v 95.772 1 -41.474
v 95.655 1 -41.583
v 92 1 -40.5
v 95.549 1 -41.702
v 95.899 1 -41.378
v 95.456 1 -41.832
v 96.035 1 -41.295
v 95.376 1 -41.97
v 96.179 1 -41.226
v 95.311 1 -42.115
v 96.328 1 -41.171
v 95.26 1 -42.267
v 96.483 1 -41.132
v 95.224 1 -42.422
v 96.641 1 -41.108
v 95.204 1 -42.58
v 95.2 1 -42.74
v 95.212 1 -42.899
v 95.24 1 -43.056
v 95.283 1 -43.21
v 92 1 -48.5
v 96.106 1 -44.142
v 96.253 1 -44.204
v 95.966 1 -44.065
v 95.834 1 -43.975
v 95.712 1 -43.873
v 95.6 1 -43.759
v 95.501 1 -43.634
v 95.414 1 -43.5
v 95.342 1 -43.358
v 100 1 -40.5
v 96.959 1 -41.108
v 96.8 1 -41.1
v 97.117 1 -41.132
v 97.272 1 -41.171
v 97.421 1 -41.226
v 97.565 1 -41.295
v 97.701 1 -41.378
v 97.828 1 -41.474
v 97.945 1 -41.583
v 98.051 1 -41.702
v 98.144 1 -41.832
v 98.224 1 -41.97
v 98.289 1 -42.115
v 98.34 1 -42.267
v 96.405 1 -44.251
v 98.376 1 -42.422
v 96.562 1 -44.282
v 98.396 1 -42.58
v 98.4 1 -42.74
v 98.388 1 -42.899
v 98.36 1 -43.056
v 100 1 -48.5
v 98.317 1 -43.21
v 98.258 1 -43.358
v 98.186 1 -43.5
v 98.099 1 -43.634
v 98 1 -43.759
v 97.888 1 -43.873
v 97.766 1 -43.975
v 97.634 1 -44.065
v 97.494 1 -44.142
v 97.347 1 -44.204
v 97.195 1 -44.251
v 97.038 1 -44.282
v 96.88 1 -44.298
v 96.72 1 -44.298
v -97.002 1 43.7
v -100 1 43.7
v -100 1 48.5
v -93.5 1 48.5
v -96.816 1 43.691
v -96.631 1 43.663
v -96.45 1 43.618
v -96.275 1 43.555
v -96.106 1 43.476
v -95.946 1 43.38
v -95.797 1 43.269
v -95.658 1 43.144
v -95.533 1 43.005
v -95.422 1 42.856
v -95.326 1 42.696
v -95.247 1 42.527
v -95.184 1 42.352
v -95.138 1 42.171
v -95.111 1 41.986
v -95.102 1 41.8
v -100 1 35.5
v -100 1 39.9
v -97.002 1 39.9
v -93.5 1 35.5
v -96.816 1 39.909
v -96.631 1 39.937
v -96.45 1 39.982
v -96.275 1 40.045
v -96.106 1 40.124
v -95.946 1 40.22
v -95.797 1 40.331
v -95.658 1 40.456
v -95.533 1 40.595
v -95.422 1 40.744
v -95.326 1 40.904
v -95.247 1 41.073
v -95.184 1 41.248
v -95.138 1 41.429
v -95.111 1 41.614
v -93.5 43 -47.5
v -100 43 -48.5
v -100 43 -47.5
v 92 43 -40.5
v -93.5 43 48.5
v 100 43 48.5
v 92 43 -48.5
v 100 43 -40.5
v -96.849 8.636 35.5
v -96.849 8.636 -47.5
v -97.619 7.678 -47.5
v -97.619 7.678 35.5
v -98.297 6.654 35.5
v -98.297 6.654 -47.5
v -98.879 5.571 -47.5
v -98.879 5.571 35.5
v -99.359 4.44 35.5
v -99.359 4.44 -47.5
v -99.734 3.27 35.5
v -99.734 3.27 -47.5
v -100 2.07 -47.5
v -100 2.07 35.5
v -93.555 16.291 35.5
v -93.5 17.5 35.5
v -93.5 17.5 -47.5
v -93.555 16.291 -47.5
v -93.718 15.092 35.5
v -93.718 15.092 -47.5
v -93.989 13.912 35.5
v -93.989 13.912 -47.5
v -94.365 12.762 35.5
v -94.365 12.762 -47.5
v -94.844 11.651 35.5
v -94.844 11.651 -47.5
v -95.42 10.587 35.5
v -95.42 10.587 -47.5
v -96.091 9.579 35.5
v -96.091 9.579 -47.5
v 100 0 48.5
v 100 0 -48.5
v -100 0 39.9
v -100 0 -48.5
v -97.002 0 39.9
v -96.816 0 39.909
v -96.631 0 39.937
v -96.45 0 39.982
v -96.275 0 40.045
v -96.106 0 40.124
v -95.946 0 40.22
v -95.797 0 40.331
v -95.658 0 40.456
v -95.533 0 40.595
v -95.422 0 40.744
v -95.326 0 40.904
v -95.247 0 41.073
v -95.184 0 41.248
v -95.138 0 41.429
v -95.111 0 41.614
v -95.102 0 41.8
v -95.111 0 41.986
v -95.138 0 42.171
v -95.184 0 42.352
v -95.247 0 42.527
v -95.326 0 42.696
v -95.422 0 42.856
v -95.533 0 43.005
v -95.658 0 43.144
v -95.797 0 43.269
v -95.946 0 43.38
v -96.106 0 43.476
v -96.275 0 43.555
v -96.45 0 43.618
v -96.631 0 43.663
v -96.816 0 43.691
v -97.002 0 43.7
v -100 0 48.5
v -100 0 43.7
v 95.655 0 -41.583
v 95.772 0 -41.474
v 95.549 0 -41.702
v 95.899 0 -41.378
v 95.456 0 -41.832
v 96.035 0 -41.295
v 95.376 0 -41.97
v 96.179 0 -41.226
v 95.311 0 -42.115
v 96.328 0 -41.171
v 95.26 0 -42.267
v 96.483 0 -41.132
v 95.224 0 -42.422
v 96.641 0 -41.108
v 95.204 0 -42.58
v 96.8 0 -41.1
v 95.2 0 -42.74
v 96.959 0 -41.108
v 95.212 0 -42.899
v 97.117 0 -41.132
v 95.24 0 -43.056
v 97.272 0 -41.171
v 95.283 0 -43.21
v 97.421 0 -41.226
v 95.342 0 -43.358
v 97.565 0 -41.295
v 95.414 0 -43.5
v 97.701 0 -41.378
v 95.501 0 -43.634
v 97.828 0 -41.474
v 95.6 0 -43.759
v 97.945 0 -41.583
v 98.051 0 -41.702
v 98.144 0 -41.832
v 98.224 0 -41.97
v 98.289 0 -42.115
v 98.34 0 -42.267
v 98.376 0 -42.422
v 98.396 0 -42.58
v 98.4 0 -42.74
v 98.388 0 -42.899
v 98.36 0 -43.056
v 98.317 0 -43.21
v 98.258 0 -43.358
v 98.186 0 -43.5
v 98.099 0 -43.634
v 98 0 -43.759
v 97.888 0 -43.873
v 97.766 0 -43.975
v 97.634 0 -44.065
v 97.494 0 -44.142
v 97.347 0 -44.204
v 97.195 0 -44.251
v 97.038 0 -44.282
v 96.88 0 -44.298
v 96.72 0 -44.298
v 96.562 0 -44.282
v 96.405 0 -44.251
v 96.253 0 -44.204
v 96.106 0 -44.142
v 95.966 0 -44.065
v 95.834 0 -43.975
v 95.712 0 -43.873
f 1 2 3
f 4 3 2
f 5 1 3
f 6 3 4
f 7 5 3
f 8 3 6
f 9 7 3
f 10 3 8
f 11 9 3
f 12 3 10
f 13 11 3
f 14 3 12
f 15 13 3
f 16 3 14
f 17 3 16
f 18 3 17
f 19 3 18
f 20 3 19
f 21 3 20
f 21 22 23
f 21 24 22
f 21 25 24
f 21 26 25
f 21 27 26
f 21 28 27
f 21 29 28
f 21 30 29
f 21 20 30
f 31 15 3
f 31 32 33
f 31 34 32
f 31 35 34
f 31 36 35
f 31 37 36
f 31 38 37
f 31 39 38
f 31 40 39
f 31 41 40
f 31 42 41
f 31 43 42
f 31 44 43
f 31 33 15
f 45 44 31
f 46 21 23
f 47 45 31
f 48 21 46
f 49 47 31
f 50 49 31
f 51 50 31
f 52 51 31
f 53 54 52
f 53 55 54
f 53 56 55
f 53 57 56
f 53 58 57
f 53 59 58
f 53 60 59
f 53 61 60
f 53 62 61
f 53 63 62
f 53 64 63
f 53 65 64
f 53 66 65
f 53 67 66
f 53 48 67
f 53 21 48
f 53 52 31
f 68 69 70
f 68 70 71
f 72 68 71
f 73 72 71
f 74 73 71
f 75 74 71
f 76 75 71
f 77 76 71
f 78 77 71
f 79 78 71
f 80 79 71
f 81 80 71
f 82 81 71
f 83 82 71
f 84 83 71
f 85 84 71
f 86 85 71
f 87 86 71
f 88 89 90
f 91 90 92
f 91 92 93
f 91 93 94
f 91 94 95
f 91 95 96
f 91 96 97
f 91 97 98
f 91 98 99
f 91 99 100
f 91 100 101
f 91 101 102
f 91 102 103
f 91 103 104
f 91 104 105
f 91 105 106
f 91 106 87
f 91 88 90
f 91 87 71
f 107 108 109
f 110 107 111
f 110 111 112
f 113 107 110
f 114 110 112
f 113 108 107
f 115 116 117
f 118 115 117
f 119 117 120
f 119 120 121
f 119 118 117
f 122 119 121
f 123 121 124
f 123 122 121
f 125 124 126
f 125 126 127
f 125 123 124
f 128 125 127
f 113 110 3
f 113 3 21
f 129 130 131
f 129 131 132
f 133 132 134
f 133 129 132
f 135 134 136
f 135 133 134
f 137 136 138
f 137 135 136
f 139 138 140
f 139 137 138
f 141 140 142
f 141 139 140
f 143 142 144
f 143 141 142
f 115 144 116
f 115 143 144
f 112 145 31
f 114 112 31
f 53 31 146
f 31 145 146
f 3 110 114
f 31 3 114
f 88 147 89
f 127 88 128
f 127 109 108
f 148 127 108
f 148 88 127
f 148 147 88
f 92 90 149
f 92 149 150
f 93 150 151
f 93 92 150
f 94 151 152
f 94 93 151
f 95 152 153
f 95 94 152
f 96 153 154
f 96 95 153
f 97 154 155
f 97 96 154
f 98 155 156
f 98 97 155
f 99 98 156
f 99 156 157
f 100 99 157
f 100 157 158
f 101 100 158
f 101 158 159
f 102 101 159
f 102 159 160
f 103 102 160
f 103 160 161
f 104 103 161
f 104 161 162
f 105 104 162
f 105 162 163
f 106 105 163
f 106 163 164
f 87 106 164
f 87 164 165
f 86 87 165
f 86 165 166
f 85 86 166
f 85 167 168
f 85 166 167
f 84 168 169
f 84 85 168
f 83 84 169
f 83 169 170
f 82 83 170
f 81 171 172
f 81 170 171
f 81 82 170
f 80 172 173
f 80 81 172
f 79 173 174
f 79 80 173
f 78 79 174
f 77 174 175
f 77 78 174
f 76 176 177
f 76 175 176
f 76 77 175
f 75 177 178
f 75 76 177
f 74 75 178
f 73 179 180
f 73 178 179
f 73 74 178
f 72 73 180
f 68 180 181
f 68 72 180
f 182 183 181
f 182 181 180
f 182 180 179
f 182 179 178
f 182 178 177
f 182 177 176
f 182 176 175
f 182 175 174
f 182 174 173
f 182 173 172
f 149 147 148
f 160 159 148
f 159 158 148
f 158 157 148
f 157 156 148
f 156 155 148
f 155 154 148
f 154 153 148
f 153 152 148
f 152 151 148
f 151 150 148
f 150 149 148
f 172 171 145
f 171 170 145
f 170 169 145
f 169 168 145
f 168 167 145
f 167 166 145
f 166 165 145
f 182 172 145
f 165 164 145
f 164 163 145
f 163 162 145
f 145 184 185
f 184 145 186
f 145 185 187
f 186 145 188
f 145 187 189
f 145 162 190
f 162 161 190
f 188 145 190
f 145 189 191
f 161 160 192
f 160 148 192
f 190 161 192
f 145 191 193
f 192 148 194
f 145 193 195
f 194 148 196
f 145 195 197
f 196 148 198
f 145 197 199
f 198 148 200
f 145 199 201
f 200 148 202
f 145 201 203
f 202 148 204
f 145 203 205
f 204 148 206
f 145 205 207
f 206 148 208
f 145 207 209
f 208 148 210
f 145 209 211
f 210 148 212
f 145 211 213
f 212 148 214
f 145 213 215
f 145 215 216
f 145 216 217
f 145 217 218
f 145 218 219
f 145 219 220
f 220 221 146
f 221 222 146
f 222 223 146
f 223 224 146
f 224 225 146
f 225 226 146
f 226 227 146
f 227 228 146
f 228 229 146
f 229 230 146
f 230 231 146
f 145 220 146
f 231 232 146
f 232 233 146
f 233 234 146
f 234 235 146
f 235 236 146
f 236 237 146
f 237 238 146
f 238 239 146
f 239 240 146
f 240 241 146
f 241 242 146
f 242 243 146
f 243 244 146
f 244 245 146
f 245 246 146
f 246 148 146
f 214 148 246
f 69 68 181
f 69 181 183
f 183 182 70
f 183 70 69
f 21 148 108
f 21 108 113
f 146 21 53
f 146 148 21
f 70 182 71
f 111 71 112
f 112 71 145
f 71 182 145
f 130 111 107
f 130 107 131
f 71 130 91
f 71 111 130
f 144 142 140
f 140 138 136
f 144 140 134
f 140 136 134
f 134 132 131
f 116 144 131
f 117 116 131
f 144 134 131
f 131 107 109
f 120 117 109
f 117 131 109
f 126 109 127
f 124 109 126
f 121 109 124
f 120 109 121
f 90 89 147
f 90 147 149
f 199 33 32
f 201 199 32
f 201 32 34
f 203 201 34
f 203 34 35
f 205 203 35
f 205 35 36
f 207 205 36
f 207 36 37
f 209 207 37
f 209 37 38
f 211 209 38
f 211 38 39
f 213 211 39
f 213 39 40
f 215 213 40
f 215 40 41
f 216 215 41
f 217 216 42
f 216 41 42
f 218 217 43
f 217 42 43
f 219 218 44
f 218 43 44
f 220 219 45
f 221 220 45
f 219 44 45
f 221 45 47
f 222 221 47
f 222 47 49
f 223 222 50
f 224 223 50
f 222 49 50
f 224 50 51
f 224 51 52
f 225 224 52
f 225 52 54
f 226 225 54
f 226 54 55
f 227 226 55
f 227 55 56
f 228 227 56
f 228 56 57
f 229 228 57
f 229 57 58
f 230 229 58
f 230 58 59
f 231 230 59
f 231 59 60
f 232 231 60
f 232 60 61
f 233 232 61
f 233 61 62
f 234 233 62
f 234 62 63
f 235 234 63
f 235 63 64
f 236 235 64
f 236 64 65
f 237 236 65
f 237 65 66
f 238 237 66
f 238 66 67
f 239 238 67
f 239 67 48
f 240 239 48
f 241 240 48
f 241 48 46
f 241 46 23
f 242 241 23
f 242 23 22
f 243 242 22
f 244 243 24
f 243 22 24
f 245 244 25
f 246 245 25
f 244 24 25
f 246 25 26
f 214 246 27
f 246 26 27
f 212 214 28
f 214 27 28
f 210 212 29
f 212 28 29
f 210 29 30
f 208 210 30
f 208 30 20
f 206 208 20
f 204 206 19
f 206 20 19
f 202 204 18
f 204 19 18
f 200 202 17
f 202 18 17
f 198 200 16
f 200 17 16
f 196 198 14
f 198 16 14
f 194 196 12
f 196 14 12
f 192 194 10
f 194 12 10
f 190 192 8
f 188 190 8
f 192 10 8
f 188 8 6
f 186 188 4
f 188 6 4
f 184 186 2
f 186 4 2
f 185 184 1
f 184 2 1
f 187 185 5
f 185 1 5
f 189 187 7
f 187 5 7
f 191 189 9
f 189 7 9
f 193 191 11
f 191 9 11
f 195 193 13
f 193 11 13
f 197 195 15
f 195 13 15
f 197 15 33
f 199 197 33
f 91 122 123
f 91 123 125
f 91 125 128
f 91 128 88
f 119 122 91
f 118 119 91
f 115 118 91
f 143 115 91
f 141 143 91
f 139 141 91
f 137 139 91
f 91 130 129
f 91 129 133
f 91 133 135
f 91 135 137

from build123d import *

# Parameters (mm, degrees)
SKETCH1_W           = 200
SKETCH1_H           = 97
BOSS_EXTRUDE1_DEPTH = 43
CUT_EXTRUDE1_DEPTH  = 96
SKETCH3_W           = 6.5
SKETCH3_H           = 13
SKETCH3_W_2         = 8
SKETCH3_H_2         = 8
CUT_EXTRUDE2_DEPTH  = 42
SKETCH4_R           = 1.6
CUT_EXTRUDE3_DEPTH  = 119.811826011


with BuildPart() as part:
    # Sketch1 → Boss-Extrude1 (new body)
    with BuildSketch(Plane(origin=(0, 0, 0), x_dir=(1, 0, 0), z_dir=(0, 1, 0))):
        Rectangle(SKETCH1_W, SKETCH1_H)
    extrude(amount=BOSS_EXTRUDE1_DEPTH)

    # Sketch2 → Cut-Extrude1 (cut)
    with BuildSketch(Plane.XY.offset(48.5)):
        with BuildLine():
            Line((-93.5, 43), (-93.5, 17.5))
            ThreePointArc((-93.5, 17.5), (-94.365227926, 12.762263764), (-96.84920953, 8.636176103))
            ThreePointArc((-96.84920953, 8.636176103), (-98.879103447, 5.571249802), (-100, 2.070130916))
            Line((-100, 2.070130916), (-100, 43))
            Line((-100, 43), (-93.5, 43))
        make_face()
    extrude(amount=-CUT_EXTRUDE1_DEPTH, mode=Mode.SUBTRACT)

    # Sketch3 → Cut-Extrude2 (cut)
    with BuildSketch(Plane(origin=(0, 43, 0), x_dir=(1, 0, 0), z_dir=(0, 1, 0))):
        with Locations((-96.75, -42)):
            Rectangle(SKETCH3_W, SKETCH3_H)
        with Locations((96, 44.5)):
            Rectangle(SKETCH3_W_2, SKETCH3_H_2)
    extrude(amount=-CUT_EXTRUDE2_DEPTH, mode=Mode.SUBTRACT)

    # Sketch4 → Cut-Extrude3 (cut, through all)
    with BuildSketch(Plane(origin=(0, 1, 0), x_dir=(1, 0, 0), z_dir=(0, 1, 0))):
        with Locations(Location((96.8, 42.7, 0), (0, 0, 270))):
            Circle(SKETCH4_R)
        with BuildLine():
            Line((-97.001938149, -43.7), (-106.165293612, -43.7))
            ThreePointArc((-106.165293612, -43.7), (-108.065293612, -41.8), (-106.165293612, -39.9))
            Line((-106.165293612, -39.9), (-97.001938149, -39.9))
            ThreePointArc((-97.001938149, -39.9), (-95.101938149, -41.8), (-97.001938149, -43.7))
        make_face()
    extrude(amount=-CUT_EXTRUDE3_DEPTH, mode=Mode.SUBTRACT)


solid = part.part
